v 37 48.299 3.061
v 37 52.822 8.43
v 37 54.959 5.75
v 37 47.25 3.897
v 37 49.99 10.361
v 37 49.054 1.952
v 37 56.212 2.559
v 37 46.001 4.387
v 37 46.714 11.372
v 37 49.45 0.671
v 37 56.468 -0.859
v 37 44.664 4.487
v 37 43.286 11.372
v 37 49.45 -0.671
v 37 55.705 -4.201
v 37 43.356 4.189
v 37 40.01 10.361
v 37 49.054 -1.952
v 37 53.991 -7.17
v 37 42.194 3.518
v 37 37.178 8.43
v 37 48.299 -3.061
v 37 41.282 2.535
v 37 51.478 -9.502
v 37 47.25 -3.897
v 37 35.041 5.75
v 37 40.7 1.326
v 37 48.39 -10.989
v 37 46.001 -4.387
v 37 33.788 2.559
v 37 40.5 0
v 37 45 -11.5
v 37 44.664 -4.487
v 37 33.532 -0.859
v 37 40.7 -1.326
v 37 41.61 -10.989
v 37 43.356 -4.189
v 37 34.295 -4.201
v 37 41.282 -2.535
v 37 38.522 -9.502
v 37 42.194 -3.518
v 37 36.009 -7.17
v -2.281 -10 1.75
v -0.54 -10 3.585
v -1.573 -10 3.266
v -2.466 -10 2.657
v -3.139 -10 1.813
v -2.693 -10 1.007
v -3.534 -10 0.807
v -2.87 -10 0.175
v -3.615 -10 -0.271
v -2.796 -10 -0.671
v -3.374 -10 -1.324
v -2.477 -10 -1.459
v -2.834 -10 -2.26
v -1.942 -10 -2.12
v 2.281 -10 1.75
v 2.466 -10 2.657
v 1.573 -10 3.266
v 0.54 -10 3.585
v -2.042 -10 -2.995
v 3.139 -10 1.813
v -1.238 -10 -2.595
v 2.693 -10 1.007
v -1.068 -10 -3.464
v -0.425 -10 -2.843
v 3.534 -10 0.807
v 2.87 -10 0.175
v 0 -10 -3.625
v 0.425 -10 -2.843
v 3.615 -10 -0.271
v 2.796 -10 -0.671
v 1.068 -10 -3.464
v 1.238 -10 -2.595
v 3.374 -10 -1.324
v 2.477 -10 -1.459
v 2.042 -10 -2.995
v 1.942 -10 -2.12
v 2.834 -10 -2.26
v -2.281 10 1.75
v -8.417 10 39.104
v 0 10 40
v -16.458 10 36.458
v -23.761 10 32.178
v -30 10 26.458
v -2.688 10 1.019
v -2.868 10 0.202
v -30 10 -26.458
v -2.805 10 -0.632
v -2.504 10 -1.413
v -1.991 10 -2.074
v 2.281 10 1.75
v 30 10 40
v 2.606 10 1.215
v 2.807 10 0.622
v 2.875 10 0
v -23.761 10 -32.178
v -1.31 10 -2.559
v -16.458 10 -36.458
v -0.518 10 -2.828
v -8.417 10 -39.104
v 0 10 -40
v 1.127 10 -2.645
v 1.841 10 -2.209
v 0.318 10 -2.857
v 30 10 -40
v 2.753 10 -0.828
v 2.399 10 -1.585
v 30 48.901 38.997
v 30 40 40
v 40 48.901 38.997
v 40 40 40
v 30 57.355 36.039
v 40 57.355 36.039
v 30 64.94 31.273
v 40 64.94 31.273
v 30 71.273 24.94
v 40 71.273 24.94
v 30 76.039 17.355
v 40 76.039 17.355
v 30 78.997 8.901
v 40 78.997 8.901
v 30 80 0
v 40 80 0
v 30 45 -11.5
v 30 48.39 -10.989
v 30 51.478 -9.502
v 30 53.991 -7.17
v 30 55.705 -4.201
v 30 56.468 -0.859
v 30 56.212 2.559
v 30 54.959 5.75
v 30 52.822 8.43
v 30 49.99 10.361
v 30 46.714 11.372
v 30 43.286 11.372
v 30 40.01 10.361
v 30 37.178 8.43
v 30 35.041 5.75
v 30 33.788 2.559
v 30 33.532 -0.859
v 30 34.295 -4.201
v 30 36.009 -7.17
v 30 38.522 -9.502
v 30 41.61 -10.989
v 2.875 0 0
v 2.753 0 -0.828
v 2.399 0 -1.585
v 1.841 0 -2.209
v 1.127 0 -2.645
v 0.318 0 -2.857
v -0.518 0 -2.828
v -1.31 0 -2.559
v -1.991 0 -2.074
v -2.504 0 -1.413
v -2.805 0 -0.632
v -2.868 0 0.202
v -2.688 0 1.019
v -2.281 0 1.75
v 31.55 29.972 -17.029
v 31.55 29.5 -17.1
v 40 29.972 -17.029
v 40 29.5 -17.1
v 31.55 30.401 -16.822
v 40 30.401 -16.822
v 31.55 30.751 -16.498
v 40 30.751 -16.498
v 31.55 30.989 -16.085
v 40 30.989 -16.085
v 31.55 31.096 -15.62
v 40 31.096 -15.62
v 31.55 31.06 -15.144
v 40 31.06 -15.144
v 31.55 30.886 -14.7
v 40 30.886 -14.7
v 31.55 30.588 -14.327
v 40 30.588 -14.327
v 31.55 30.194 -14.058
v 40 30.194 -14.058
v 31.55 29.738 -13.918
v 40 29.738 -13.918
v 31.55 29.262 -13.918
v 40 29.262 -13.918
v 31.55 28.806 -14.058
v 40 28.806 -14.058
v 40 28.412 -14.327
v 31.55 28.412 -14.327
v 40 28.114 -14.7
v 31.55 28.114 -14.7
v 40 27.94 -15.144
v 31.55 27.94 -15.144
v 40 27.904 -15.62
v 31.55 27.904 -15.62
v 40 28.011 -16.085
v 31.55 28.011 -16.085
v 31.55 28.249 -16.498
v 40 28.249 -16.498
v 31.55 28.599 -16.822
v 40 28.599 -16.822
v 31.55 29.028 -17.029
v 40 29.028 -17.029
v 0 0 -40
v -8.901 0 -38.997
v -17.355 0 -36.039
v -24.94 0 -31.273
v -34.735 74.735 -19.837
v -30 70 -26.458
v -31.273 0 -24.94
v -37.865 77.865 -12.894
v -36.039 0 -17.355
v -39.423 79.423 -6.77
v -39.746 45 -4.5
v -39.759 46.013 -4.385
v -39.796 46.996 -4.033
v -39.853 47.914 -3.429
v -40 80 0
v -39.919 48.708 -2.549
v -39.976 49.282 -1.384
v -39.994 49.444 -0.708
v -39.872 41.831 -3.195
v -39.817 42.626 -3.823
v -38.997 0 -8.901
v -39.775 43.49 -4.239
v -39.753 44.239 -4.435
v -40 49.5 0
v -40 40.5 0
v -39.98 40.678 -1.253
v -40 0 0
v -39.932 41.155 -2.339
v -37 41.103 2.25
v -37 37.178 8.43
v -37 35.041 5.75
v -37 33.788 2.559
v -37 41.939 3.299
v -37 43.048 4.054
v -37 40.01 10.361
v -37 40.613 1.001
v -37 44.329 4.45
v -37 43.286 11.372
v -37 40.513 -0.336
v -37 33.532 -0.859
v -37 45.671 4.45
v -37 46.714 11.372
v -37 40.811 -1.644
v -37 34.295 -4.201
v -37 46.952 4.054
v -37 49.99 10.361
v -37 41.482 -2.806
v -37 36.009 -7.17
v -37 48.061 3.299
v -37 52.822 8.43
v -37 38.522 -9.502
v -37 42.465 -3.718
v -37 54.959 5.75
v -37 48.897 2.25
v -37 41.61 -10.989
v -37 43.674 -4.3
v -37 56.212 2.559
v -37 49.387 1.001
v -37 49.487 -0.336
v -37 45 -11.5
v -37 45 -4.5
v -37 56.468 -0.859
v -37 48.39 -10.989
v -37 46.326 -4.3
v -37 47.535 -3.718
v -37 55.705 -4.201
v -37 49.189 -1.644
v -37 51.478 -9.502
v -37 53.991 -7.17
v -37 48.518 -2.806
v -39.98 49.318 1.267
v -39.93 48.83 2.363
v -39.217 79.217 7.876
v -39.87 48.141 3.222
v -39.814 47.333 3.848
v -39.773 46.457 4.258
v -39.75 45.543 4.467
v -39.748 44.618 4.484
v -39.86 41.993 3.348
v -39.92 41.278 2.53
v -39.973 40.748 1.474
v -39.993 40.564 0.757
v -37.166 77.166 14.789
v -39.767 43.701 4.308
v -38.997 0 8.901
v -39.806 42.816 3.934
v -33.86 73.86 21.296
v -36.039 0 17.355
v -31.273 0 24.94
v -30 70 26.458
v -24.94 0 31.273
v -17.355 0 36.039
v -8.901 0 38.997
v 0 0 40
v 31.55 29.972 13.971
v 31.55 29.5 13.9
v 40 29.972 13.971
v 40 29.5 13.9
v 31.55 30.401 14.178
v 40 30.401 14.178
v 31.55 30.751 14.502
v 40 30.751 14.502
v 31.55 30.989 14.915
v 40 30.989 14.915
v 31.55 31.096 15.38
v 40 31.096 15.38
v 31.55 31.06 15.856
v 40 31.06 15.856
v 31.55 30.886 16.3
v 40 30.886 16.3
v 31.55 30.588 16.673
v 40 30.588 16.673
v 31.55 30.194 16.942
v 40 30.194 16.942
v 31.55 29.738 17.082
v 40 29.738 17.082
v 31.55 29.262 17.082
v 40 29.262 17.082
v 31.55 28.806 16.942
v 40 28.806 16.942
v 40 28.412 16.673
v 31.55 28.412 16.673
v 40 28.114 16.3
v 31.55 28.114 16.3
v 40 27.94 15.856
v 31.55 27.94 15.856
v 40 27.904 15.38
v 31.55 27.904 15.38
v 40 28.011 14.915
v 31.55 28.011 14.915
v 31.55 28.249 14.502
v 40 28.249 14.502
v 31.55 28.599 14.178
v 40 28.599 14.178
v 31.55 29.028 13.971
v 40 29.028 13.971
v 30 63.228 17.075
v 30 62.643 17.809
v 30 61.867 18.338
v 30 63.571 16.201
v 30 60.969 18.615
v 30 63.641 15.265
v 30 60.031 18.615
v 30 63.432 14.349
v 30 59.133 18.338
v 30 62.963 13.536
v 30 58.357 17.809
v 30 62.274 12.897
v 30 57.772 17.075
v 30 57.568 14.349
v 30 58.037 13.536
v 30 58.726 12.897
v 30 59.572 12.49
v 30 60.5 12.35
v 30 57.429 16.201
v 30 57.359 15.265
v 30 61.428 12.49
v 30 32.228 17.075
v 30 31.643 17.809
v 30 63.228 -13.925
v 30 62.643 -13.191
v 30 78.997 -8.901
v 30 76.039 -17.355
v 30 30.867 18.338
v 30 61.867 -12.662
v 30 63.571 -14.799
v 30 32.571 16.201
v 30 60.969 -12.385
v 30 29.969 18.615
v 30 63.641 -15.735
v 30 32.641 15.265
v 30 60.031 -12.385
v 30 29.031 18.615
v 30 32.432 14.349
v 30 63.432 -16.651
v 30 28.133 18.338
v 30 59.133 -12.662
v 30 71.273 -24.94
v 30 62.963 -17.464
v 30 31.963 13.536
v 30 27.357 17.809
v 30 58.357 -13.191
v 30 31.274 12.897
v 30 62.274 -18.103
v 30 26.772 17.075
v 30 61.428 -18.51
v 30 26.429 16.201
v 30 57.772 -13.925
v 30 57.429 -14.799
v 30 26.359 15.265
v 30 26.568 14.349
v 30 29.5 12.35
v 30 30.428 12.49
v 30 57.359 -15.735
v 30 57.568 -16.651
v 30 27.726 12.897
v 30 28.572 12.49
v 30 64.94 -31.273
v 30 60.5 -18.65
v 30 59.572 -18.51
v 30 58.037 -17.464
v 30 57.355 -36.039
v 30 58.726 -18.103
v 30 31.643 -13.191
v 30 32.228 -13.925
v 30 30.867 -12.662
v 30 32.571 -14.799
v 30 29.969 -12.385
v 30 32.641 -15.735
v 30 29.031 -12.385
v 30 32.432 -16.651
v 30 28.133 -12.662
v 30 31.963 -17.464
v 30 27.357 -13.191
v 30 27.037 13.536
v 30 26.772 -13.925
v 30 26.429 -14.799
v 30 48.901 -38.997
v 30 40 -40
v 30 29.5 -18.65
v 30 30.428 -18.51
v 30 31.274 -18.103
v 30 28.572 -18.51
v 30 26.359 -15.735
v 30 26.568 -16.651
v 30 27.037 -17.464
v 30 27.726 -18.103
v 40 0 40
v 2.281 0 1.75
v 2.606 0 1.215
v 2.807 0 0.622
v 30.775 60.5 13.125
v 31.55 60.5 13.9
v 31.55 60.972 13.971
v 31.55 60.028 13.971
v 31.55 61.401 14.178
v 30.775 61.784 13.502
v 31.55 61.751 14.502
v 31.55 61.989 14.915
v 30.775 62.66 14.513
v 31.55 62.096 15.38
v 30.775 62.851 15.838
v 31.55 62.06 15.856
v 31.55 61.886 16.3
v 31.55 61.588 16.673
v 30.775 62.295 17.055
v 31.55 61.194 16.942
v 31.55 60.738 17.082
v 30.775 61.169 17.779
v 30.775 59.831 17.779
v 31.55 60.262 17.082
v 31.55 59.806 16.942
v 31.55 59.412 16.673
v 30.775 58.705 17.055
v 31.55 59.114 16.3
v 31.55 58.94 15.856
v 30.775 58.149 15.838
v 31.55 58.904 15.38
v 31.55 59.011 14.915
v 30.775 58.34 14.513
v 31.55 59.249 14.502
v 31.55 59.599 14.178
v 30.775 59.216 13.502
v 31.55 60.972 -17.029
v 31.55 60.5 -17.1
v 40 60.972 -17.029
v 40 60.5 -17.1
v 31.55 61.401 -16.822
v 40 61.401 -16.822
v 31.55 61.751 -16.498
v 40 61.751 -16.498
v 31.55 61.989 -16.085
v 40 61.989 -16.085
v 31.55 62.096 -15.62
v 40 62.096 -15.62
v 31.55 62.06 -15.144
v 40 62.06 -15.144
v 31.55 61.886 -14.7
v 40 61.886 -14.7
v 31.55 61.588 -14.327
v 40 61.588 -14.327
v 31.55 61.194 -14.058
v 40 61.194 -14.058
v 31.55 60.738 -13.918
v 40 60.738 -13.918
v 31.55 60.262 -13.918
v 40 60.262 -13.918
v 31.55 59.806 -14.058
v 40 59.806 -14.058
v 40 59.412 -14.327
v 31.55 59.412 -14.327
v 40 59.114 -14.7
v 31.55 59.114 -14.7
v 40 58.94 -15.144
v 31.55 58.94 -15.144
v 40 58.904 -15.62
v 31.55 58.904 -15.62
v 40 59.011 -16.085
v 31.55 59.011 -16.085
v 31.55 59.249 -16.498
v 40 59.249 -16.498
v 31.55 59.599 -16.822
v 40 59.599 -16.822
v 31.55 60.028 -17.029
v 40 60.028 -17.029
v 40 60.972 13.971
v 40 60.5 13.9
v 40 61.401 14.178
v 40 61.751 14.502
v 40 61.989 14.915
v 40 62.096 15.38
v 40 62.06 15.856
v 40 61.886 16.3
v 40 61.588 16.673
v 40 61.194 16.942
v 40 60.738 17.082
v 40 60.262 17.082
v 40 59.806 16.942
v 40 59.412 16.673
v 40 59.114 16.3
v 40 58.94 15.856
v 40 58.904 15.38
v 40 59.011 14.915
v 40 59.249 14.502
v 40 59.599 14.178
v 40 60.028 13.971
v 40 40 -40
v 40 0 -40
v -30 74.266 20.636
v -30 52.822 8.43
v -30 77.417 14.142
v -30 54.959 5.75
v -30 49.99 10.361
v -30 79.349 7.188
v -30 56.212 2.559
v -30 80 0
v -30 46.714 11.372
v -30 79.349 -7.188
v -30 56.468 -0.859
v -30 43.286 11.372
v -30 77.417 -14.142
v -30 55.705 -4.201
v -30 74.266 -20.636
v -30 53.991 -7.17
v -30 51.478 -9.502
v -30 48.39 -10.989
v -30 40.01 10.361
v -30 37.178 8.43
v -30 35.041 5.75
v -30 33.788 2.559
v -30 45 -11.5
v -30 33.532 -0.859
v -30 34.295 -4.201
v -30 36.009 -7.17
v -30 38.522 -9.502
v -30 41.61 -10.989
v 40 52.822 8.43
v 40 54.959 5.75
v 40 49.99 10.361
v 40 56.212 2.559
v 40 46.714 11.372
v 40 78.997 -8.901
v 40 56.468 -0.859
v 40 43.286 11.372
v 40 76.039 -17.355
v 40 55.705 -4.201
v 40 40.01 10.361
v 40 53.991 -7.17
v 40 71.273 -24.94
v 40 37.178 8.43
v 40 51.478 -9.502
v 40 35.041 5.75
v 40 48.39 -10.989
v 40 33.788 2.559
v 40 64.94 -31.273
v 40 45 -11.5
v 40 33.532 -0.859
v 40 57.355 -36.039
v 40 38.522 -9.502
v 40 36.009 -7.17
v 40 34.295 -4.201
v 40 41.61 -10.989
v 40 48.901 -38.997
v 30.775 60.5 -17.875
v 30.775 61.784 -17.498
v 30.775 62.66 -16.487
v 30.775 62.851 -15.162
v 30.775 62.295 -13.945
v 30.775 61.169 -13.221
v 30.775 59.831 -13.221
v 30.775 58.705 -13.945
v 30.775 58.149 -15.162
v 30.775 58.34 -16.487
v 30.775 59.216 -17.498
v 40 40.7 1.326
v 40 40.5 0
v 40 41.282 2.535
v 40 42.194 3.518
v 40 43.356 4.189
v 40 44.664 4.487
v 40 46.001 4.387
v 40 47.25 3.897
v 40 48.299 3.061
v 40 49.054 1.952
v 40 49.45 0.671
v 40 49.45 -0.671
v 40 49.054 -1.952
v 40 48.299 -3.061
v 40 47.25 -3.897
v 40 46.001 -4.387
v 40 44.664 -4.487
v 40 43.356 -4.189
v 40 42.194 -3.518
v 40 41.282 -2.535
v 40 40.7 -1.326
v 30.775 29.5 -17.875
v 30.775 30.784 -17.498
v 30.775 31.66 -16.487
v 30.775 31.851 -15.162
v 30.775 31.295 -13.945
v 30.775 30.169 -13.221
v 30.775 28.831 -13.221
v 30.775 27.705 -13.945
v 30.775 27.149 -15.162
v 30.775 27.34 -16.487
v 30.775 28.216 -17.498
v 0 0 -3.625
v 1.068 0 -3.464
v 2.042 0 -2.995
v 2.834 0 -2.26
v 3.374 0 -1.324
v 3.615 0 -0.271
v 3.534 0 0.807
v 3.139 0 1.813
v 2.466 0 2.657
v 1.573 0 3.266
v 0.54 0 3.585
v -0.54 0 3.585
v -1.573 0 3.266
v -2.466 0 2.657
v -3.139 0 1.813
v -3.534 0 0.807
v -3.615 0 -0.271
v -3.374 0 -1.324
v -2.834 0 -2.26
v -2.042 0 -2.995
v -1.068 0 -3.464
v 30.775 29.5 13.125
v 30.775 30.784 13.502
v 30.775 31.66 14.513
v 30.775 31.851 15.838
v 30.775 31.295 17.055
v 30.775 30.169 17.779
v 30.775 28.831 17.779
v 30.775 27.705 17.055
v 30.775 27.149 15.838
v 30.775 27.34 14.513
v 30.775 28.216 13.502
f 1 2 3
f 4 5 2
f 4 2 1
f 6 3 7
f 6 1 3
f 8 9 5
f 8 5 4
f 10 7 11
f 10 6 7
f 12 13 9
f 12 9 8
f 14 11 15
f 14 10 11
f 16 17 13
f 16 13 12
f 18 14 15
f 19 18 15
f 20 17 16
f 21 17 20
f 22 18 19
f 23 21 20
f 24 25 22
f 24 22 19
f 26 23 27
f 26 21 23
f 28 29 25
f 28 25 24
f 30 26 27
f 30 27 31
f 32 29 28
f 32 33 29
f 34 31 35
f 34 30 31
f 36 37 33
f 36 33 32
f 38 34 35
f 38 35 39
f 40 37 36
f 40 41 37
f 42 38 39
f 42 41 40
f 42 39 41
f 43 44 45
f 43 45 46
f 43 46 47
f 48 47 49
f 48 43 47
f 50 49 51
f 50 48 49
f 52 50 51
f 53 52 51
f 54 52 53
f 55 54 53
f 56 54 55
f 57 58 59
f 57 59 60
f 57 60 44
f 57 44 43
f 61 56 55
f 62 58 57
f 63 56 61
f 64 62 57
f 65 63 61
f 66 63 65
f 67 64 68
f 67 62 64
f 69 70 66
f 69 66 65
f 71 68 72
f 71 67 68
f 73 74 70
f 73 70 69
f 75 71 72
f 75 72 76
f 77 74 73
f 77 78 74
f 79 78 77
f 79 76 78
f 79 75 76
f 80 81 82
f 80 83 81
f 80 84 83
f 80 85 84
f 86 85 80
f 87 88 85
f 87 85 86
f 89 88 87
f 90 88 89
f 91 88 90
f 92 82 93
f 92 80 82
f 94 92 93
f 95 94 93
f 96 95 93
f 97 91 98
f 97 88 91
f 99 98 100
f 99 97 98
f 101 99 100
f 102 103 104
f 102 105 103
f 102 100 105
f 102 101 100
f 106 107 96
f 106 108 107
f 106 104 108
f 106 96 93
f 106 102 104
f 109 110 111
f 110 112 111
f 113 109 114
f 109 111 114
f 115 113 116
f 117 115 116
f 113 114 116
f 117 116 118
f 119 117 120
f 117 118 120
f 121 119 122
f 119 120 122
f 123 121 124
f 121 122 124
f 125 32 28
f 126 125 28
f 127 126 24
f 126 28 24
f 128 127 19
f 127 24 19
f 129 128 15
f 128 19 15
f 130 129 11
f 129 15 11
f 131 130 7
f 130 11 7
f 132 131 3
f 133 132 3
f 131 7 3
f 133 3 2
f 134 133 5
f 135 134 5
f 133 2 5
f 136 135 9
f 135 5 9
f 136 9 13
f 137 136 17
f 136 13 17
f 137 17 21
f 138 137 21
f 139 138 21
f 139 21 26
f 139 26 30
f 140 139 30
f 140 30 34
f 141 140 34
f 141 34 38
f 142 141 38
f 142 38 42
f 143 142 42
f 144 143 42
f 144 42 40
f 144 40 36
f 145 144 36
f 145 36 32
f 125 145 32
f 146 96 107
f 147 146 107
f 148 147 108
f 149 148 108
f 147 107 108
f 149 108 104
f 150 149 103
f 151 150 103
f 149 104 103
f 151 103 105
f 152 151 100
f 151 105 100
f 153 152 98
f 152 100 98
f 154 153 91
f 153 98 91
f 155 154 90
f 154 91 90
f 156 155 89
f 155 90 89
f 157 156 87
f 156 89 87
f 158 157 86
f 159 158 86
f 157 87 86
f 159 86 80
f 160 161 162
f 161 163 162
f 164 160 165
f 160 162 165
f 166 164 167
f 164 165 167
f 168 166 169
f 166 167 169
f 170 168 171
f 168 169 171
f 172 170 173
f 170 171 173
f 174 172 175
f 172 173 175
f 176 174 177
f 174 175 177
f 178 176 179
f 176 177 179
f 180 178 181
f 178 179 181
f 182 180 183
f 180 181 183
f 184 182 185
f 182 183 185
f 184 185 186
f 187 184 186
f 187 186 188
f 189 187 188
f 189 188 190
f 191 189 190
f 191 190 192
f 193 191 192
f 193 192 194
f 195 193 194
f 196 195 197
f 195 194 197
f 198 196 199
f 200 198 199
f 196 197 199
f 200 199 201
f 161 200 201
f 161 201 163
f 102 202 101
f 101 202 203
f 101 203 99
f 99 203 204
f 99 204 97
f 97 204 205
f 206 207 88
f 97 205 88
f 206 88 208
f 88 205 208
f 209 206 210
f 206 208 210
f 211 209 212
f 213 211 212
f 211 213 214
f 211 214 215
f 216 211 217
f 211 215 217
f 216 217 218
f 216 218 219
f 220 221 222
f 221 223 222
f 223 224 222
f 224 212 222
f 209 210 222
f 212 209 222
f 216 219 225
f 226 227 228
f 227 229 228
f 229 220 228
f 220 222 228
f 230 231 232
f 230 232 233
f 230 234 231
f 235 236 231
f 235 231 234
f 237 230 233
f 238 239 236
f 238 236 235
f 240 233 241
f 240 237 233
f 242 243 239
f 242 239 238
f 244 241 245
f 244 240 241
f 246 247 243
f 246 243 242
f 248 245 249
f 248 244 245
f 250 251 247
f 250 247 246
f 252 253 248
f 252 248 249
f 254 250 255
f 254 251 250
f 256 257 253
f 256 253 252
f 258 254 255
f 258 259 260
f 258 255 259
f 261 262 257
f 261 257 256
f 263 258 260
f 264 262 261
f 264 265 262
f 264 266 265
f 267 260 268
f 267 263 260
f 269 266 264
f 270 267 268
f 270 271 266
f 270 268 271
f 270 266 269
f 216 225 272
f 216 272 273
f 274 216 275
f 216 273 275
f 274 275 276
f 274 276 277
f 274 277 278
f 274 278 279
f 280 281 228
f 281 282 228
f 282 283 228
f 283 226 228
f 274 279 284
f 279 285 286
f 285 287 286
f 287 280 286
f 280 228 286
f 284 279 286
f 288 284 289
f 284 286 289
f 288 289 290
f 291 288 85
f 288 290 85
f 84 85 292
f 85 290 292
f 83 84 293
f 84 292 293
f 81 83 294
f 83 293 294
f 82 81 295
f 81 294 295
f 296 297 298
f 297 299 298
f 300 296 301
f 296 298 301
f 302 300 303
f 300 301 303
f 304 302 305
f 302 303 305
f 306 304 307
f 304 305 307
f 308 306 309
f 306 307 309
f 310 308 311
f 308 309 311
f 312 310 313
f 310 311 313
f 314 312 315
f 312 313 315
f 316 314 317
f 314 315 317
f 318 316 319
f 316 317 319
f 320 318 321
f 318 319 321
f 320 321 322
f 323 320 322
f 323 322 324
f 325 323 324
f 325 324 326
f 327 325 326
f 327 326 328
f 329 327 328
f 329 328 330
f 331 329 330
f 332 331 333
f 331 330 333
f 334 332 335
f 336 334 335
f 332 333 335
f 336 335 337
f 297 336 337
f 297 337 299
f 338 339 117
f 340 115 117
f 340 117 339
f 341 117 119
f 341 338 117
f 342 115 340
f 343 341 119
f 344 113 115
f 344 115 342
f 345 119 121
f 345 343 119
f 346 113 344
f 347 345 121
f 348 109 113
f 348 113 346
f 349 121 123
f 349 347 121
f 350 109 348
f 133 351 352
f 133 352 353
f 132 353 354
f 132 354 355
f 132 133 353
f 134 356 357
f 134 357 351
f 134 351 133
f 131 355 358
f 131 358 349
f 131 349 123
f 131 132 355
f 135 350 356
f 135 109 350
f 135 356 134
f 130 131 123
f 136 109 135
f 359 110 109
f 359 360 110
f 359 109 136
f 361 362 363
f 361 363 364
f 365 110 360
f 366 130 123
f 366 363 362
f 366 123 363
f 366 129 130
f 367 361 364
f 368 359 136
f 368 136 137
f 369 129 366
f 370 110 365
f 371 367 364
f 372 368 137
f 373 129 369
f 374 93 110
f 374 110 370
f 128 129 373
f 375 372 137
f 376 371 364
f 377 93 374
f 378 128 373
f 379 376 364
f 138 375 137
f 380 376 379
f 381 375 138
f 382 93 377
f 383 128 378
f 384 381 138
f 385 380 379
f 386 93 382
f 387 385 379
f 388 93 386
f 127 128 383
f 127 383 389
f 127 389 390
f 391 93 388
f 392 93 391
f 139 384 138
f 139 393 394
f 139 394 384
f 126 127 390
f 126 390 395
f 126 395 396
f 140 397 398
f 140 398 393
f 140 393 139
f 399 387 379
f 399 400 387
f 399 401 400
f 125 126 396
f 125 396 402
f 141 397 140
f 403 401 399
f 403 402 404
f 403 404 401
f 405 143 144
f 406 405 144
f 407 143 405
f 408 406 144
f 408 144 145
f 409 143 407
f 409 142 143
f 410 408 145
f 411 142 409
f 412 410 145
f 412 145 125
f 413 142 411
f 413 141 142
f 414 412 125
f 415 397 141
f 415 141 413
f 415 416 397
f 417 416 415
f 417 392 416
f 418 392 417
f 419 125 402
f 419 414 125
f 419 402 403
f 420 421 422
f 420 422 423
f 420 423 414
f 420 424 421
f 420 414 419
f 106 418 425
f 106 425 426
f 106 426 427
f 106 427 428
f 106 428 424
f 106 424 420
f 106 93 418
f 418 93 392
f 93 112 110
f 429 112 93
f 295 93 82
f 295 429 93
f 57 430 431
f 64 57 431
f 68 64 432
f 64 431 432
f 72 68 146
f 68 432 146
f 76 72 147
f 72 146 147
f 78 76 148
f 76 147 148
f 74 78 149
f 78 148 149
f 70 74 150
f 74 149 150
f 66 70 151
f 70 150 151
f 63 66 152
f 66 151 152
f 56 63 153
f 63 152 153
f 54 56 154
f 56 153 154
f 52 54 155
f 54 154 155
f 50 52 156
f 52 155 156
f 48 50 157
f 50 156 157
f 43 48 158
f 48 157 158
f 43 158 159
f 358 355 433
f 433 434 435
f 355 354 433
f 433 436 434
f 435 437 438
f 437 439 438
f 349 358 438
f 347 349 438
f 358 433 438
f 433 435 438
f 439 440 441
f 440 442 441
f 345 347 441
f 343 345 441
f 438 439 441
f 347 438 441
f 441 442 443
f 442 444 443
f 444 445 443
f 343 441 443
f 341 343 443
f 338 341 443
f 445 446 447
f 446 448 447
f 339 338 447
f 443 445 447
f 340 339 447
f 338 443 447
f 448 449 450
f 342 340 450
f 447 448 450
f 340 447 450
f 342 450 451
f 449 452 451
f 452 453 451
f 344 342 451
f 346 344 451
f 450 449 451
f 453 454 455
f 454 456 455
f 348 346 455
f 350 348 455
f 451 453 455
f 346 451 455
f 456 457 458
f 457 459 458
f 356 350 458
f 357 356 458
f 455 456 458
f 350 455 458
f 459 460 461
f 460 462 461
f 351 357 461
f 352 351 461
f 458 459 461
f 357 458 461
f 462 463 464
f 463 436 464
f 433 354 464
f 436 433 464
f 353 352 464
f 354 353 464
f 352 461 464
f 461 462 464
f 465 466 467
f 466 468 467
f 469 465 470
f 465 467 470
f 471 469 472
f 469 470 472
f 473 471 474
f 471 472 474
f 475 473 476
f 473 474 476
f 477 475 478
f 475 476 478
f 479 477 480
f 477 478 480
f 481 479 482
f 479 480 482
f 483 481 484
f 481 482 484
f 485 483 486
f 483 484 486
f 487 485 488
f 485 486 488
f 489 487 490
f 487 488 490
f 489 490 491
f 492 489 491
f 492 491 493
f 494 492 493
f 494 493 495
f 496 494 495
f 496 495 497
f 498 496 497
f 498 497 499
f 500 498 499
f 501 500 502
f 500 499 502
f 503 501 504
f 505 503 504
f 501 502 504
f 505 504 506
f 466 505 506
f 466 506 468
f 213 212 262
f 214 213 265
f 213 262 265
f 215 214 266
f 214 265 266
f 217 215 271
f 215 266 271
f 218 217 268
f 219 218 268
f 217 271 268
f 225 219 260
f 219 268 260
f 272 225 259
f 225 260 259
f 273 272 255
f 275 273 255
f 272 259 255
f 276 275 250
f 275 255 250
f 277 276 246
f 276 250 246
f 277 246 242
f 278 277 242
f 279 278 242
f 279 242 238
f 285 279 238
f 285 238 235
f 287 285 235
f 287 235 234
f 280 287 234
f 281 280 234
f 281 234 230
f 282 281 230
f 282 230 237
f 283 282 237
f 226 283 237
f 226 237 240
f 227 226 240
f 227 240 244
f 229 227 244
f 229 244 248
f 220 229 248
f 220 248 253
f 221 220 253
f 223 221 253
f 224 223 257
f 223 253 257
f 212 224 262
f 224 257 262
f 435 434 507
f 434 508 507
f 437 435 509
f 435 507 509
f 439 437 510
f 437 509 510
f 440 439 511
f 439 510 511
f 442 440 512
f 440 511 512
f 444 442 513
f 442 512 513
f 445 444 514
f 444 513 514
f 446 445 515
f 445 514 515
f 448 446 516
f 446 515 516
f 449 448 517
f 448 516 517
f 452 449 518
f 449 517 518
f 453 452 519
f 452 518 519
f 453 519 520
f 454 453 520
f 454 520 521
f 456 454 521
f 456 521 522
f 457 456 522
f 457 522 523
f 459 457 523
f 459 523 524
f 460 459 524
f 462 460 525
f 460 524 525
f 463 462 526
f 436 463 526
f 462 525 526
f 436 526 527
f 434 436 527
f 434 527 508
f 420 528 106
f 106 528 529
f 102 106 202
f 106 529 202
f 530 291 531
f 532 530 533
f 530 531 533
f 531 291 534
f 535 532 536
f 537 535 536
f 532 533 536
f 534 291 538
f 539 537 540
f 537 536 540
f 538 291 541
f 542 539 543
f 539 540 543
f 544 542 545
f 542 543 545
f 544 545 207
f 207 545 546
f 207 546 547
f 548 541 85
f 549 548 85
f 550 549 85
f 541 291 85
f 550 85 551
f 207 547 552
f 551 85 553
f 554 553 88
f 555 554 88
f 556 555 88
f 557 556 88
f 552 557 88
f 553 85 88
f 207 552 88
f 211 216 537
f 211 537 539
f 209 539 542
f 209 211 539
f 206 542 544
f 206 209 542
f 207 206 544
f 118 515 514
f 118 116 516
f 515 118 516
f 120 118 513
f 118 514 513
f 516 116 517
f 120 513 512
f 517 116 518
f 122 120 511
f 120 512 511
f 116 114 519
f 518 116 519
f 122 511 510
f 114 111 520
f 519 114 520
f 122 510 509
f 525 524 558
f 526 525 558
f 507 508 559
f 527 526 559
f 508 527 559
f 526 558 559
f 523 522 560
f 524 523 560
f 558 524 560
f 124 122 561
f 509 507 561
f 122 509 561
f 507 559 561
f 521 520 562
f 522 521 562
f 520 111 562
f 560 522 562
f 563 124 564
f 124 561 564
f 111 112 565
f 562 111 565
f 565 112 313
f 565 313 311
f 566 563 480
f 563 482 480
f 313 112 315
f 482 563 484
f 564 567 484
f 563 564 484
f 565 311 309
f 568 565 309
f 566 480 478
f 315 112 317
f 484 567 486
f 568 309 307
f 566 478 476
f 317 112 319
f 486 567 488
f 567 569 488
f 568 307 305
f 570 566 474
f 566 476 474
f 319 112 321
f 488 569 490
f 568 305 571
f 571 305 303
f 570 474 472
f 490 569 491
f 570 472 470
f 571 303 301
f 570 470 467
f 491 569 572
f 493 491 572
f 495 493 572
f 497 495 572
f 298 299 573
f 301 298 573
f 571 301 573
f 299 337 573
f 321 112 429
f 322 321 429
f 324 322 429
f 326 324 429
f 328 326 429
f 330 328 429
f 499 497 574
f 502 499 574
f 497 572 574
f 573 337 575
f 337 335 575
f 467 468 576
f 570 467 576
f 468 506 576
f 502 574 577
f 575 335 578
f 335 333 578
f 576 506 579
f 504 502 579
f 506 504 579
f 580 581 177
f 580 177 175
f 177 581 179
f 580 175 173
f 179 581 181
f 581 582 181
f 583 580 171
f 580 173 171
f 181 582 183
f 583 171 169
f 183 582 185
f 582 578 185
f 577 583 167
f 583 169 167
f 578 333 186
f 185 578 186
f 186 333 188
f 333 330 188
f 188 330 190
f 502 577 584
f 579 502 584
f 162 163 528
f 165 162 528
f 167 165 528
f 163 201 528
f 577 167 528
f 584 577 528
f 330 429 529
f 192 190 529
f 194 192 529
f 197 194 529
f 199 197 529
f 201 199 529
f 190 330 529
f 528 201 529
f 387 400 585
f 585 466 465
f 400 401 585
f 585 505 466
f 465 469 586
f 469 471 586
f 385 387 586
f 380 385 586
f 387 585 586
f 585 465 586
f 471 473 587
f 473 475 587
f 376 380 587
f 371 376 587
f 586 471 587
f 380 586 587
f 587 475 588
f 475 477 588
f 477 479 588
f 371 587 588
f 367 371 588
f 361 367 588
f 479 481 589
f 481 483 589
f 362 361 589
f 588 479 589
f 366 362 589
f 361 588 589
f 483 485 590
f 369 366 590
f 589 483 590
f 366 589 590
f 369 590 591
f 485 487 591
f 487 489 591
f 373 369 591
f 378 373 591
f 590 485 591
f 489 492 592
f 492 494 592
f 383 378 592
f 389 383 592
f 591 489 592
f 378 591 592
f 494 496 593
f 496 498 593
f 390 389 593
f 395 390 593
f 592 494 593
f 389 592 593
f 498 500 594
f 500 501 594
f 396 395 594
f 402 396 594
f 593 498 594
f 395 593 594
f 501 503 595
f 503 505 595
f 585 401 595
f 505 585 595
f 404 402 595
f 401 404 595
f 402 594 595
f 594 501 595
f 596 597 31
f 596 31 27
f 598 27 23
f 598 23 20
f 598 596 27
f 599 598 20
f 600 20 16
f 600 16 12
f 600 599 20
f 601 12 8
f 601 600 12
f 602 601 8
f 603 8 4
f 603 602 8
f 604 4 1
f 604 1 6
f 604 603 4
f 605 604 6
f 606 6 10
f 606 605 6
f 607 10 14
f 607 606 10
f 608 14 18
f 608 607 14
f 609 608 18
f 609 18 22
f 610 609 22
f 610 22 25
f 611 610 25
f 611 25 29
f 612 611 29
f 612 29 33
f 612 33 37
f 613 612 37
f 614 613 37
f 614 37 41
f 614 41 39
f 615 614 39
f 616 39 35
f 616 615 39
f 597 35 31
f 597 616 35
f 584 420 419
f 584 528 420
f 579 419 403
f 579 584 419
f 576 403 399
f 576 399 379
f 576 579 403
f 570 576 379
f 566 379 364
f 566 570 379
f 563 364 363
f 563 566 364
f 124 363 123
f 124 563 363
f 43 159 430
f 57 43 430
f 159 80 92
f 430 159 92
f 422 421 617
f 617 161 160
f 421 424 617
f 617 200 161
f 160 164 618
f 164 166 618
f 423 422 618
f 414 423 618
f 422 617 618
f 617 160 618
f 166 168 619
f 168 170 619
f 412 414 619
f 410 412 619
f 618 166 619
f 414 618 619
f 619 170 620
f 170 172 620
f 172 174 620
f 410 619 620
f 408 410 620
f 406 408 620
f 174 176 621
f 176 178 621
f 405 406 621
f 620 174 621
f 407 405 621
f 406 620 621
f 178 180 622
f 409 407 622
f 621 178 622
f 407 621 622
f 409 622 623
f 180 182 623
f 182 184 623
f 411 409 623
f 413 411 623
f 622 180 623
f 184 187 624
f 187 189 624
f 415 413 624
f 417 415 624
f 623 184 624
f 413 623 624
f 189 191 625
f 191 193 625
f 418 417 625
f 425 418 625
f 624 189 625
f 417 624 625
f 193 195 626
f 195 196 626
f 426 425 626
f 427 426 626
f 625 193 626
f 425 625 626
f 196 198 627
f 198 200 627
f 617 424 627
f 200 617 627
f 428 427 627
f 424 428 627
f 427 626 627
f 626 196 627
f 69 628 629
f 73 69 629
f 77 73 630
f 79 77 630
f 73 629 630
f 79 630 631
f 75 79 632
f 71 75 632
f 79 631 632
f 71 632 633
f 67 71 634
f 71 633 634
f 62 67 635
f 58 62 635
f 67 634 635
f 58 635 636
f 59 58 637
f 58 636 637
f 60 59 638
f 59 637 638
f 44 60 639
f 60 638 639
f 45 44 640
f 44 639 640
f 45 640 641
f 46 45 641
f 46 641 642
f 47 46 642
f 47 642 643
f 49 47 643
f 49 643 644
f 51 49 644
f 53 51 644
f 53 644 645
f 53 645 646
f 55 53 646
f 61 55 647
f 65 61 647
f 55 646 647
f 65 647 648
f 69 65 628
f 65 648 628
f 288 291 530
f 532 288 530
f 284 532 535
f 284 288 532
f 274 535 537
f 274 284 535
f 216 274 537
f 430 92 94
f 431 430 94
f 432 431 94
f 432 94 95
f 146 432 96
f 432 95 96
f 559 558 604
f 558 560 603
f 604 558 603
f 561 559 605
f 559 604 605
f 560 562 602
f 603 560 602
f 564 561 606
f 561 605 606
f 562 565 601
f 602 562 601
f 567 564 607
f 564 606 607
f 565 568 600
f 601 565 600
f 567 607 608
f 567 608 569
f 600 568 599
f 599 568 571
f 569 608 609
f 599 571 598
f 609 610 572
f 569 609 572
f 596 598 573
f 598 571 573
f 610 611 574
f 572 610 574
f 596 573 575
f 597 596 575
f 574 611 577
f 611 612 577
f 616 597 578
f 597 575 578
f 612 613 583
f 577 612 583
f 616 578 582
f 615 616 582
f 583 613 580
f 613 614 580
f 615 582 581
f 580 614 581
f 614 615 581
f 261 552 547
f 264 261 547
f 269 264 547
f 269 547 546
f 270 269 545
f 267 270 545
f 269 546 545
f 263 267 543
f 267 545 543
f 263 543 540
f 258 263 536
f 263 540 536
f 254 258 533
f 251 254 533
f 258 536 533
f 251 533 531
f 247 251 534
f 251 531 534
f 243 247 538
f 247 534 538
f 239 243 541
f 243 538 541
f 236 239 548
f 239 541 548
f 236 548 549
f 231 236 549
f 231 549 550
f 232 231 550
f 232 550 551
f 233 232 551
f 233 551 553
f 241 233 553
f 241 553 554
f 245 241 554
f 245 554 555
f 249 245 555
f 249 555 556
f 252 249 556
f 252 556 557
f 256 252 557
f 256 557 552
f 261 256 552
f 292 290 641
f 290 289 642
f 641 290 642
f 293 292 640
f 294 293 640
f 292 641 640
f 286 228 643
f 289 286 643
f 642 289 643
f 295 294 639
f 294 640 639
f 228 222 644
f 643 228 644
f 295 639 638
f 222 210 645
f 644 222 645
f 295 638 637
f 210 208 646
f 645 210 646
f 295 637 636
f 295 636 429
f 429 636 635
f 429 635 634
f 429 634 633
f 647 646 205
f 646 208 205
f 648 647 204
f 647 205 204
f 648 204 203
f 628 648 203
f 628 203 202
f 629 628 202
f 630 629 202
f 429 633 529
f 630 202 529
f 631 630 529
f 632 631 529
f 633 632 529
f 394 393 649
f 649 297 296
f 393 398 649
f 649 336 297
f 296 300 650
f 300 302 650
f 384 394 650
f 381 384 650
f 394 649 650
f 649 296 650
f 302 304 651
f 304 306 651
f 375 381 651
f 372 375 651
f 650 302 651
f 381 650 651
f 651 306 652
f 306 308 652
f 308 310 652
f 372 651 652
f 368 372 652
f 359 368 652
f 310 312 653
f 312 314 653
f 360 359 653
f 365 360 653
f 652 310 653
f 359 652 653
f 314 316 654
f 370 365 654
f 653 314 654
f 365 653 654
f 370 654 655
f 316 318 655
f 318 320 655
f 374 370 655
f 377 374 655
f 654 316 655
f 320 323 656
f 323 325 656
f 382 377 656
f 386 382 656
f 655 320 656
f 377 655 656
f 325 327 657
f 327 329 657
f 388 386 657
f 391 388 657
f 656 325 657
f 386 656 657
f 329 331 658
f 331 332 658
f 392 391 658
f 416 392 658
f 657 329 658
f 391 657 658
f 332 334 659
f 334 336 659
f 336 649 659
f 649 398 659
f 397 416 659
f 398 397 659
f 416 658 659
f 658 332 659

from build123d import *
from build123d.topology import SkipClean

# Parameters (mm, degrees)
SKETCH1_W                                           = 80
SKETCH1_H                                           = 80
BOSS_EXTRUDE1_DEPTH                                 = 10
SKETCH2_W                                           = 10
SKETCH2_H                                           = 80
BOSS_EXTRUDE2_DEPTH                                 = 70
CSK_FOR_M3_COUNTERSUNK_FLAT_HEAD_SCREW1_D           = 3.2
CSK_FOR_M3_COUNTERSUNK_FLAT_HEAD_SCREW1_CSINK_D     = 6.3
CSK_FOR_M3_COUNTERSUNK_FLAT_HEAD_SCREW1_CSINK_ANGLE = 90
CUT_EXTRUDE2_DEPTH                                  = 91
SKETCH7_R                                           = 11.5
CUT_EXTRUDE1_DEPTH                                  = 121
FILLET2_R                                           = 40
SKETCH12_R                                          = 3.625
BOSS_EXTRUDE3_DEPTH                                 = 10
BOSS_EXTRUDE4_START                                 = -7
SKETCH14_R                                          = 11.5
SKETCH14_R_2                                        = 4.5
BOSS_EXTRUDE4_DEPTH                                 = 3
CUT_EXTRUDE4_DEPTH                                  = 98.979589711
BOSS_EXTRUDE5_START                                 = -10
SKETCH15_R                                          = 11.5
SKETCH15_R_2                                        = 4.5
BOSS_EXTRUDE5_DEPTH                                 = 3


with BuildPart() as part:
    # Sketch1 → Boss-Extrude1 (new body)
    with BuildSketch(Plane(origin=(0, 0, 0), x_dir=(1, 0, 0), z_dir=(0, 1, 0))):
        Rectangle(SKETCH1_W, SKETCH1_H)
    extrude(amount=BOSS_EXTRUDE1_DEPTH)

    # Sketch2 → Boss-Extrude2 (add)
    with BuildSketch(Plane(origin=(0, 10, 0), x_dir=(1, 0, 0), z_dir=(0, 1, 0))):
        with Locations((35, 0)):
            Rectangle(SKETCH2_W, SKETCH2_H)
    boss_extrude2 = extrude(amount=BOSS_EXTRUDE2_DEPTH)

    # CSK for M3 Countersunk Flat Head Screw1 (through all)
    with Locations(Plane.ZY.offset(-30)):
        with Locations((-15.5, 60.5), (15.5, 60.5), (15.5, 29.5), (-15.5, 29.5)):
            CounterSinkHole(CSK_FOR_M3_COUNTERSUNK_FLAT_HEAD_SCREW1_D / 2, CSK_FOR_M3_COUNTERSUNK_FLAT_HEAD_SCREW1_CSINK_D / 2, counter_sink_angle=CSK_FOR_M3_COUNTERSUNK_FLAT_HEAD_SCREW1_CSINK_ANGLE)

    # Mirror1: Boss-Extrude2 across plane
    add(boss_extrude2.mirror(Plane(origin=(0, 0, 0), x_dir=(0, 0, 1), z_dir=(1, 0, 0))))

    # Sketch11 → Cut-Extrude2 (cut, through all)
    with BuildSketch(Plane(origin=(0, 10, 0), x_dir=(1, 0, 0), z_dir=(0, 1, 0))):
        with BuildLine():
            Line((-2.281035949, -1.75), (2.281035949, -1.75))
            ThreePointArc((2.281035949, -1.75), (2.722462429, -0.924025608), (2.875, 0))
            ThreePointArc((2.875, 0), (-0.924025608, 2.722462429), (-2.281035949, -1.75))
        make_face()
    extrude(amount=-CUT_EXTRUDE2_DEPTH, mode=Mode.SUBTRACT)

    # Sketch7 → Cut-Extrude1 (cut, through all)
    with BuildSketch(Plane(origin=(40, 0, 0), x_dir=(0, 0, -1), z_dir=(1, 0, 0))):
        with Locations((0, 45)):
            Circle(SKETCH7_R)
    extrude(amount=-CUT_EXTRUDE1_DEPTH, mode=Mode.SUBTRACT)

    # Fillet2
    fillet2_edges = [part.edges().sort_by_distance(p)[0] for p in [
        (35, 80, -40),
        (35, 80, 40),
        (-35, 80, 40),
        (-35, 80, -40),
    ]]
    fillet(fillet2_edges, radius=FILLET2_R - 0.0001)  # a hair under: the kernel refuses the full size

    # Sketch12 → Boss-Extrude3 (add)
    with BuildSketch(Plane.XZ):
        with Locations(Location((0, 0, 0), (0, 0, 270))):
            Circle(SKETCH12_R)
        with BuildLine():
            Line((-2.281035949, 1.75), (2.281035949, 1.75))
            ThreePointArc((2.281035949, 1.75), (0, -2.875), (-2.281035949, 1.75))
        make_face(mode=Mode.SUBTRACT)
    extrude(amount=BOSS_EXTRUDE3_DEPTH)

    # Sketch14 → Boss-Extrude4 (add)
    with BuildSketch(Plane(origin=(-30, 0, 0), x_dir=(0, 0, -1), z_dir=(1, 0, 0)).offset(BOSS_EXTRUDE4_START)):
        with Locations((0, 45)):
            Circle(SKETCH14_R)
        with Locations((0, 45)):
            Circle(SKETCH14_R_2, mode=Mode.SUBTRACT)
    extrude(amount=-BOSS_EXTRUDE4_DEPTH)

    # Sketch13 → Cut-Extrude4 (cut, through all)
    with SkipClean():  # the faces are left unmerged after this step: merging them gives an invalid solid
        with BuildSketch(Plane(origin=(0, 0, 0), x_dir=(-1, 0, 0), z_dir=(0, -1, 0))):
            with BuildLine():
                Line((40, -40), (40, 0))
                ThreePointArc((40, 0), (28.284271346, -28.284271149), (2.79e-07, -40))
                Line((2.79e-07, -40), (40, -40))
            make_face()
            with BuildLine():
                Line((40, 0), (40, 40))
                Line((40, 40), (2.4e-08, 40))
                ThreePointArc((2.4e-08, 40), (28.284271256, 28.284271239), (40, 0))
            make_face()
        extrude(amount=-CUT_EXTRUDE4_DEPTH, mode=Mode.SUBTRACT)

    # Sketch15 → Boss-Extrude5 (add)
    with SkipClean():  # the faces are left unmerged after this step: merging them gives an invalid solid
        with BuildSketch(Plane.ZY.offset(-30).offset(BOSS_EXTRUDE5_START)):
            with Locations(Location((0, 45, 0), (0, 0, 180))):
                Circle(SKETCH15_R)
            with Locations(Location((0, 45, 0), (0, 0, 270))):
                Circle(SKETCH15_R_2, mode=Mode.SUBTRACT)
        extrude(amount=BOSS_EXTRUDE5_DEPTH)


solid = part.part
